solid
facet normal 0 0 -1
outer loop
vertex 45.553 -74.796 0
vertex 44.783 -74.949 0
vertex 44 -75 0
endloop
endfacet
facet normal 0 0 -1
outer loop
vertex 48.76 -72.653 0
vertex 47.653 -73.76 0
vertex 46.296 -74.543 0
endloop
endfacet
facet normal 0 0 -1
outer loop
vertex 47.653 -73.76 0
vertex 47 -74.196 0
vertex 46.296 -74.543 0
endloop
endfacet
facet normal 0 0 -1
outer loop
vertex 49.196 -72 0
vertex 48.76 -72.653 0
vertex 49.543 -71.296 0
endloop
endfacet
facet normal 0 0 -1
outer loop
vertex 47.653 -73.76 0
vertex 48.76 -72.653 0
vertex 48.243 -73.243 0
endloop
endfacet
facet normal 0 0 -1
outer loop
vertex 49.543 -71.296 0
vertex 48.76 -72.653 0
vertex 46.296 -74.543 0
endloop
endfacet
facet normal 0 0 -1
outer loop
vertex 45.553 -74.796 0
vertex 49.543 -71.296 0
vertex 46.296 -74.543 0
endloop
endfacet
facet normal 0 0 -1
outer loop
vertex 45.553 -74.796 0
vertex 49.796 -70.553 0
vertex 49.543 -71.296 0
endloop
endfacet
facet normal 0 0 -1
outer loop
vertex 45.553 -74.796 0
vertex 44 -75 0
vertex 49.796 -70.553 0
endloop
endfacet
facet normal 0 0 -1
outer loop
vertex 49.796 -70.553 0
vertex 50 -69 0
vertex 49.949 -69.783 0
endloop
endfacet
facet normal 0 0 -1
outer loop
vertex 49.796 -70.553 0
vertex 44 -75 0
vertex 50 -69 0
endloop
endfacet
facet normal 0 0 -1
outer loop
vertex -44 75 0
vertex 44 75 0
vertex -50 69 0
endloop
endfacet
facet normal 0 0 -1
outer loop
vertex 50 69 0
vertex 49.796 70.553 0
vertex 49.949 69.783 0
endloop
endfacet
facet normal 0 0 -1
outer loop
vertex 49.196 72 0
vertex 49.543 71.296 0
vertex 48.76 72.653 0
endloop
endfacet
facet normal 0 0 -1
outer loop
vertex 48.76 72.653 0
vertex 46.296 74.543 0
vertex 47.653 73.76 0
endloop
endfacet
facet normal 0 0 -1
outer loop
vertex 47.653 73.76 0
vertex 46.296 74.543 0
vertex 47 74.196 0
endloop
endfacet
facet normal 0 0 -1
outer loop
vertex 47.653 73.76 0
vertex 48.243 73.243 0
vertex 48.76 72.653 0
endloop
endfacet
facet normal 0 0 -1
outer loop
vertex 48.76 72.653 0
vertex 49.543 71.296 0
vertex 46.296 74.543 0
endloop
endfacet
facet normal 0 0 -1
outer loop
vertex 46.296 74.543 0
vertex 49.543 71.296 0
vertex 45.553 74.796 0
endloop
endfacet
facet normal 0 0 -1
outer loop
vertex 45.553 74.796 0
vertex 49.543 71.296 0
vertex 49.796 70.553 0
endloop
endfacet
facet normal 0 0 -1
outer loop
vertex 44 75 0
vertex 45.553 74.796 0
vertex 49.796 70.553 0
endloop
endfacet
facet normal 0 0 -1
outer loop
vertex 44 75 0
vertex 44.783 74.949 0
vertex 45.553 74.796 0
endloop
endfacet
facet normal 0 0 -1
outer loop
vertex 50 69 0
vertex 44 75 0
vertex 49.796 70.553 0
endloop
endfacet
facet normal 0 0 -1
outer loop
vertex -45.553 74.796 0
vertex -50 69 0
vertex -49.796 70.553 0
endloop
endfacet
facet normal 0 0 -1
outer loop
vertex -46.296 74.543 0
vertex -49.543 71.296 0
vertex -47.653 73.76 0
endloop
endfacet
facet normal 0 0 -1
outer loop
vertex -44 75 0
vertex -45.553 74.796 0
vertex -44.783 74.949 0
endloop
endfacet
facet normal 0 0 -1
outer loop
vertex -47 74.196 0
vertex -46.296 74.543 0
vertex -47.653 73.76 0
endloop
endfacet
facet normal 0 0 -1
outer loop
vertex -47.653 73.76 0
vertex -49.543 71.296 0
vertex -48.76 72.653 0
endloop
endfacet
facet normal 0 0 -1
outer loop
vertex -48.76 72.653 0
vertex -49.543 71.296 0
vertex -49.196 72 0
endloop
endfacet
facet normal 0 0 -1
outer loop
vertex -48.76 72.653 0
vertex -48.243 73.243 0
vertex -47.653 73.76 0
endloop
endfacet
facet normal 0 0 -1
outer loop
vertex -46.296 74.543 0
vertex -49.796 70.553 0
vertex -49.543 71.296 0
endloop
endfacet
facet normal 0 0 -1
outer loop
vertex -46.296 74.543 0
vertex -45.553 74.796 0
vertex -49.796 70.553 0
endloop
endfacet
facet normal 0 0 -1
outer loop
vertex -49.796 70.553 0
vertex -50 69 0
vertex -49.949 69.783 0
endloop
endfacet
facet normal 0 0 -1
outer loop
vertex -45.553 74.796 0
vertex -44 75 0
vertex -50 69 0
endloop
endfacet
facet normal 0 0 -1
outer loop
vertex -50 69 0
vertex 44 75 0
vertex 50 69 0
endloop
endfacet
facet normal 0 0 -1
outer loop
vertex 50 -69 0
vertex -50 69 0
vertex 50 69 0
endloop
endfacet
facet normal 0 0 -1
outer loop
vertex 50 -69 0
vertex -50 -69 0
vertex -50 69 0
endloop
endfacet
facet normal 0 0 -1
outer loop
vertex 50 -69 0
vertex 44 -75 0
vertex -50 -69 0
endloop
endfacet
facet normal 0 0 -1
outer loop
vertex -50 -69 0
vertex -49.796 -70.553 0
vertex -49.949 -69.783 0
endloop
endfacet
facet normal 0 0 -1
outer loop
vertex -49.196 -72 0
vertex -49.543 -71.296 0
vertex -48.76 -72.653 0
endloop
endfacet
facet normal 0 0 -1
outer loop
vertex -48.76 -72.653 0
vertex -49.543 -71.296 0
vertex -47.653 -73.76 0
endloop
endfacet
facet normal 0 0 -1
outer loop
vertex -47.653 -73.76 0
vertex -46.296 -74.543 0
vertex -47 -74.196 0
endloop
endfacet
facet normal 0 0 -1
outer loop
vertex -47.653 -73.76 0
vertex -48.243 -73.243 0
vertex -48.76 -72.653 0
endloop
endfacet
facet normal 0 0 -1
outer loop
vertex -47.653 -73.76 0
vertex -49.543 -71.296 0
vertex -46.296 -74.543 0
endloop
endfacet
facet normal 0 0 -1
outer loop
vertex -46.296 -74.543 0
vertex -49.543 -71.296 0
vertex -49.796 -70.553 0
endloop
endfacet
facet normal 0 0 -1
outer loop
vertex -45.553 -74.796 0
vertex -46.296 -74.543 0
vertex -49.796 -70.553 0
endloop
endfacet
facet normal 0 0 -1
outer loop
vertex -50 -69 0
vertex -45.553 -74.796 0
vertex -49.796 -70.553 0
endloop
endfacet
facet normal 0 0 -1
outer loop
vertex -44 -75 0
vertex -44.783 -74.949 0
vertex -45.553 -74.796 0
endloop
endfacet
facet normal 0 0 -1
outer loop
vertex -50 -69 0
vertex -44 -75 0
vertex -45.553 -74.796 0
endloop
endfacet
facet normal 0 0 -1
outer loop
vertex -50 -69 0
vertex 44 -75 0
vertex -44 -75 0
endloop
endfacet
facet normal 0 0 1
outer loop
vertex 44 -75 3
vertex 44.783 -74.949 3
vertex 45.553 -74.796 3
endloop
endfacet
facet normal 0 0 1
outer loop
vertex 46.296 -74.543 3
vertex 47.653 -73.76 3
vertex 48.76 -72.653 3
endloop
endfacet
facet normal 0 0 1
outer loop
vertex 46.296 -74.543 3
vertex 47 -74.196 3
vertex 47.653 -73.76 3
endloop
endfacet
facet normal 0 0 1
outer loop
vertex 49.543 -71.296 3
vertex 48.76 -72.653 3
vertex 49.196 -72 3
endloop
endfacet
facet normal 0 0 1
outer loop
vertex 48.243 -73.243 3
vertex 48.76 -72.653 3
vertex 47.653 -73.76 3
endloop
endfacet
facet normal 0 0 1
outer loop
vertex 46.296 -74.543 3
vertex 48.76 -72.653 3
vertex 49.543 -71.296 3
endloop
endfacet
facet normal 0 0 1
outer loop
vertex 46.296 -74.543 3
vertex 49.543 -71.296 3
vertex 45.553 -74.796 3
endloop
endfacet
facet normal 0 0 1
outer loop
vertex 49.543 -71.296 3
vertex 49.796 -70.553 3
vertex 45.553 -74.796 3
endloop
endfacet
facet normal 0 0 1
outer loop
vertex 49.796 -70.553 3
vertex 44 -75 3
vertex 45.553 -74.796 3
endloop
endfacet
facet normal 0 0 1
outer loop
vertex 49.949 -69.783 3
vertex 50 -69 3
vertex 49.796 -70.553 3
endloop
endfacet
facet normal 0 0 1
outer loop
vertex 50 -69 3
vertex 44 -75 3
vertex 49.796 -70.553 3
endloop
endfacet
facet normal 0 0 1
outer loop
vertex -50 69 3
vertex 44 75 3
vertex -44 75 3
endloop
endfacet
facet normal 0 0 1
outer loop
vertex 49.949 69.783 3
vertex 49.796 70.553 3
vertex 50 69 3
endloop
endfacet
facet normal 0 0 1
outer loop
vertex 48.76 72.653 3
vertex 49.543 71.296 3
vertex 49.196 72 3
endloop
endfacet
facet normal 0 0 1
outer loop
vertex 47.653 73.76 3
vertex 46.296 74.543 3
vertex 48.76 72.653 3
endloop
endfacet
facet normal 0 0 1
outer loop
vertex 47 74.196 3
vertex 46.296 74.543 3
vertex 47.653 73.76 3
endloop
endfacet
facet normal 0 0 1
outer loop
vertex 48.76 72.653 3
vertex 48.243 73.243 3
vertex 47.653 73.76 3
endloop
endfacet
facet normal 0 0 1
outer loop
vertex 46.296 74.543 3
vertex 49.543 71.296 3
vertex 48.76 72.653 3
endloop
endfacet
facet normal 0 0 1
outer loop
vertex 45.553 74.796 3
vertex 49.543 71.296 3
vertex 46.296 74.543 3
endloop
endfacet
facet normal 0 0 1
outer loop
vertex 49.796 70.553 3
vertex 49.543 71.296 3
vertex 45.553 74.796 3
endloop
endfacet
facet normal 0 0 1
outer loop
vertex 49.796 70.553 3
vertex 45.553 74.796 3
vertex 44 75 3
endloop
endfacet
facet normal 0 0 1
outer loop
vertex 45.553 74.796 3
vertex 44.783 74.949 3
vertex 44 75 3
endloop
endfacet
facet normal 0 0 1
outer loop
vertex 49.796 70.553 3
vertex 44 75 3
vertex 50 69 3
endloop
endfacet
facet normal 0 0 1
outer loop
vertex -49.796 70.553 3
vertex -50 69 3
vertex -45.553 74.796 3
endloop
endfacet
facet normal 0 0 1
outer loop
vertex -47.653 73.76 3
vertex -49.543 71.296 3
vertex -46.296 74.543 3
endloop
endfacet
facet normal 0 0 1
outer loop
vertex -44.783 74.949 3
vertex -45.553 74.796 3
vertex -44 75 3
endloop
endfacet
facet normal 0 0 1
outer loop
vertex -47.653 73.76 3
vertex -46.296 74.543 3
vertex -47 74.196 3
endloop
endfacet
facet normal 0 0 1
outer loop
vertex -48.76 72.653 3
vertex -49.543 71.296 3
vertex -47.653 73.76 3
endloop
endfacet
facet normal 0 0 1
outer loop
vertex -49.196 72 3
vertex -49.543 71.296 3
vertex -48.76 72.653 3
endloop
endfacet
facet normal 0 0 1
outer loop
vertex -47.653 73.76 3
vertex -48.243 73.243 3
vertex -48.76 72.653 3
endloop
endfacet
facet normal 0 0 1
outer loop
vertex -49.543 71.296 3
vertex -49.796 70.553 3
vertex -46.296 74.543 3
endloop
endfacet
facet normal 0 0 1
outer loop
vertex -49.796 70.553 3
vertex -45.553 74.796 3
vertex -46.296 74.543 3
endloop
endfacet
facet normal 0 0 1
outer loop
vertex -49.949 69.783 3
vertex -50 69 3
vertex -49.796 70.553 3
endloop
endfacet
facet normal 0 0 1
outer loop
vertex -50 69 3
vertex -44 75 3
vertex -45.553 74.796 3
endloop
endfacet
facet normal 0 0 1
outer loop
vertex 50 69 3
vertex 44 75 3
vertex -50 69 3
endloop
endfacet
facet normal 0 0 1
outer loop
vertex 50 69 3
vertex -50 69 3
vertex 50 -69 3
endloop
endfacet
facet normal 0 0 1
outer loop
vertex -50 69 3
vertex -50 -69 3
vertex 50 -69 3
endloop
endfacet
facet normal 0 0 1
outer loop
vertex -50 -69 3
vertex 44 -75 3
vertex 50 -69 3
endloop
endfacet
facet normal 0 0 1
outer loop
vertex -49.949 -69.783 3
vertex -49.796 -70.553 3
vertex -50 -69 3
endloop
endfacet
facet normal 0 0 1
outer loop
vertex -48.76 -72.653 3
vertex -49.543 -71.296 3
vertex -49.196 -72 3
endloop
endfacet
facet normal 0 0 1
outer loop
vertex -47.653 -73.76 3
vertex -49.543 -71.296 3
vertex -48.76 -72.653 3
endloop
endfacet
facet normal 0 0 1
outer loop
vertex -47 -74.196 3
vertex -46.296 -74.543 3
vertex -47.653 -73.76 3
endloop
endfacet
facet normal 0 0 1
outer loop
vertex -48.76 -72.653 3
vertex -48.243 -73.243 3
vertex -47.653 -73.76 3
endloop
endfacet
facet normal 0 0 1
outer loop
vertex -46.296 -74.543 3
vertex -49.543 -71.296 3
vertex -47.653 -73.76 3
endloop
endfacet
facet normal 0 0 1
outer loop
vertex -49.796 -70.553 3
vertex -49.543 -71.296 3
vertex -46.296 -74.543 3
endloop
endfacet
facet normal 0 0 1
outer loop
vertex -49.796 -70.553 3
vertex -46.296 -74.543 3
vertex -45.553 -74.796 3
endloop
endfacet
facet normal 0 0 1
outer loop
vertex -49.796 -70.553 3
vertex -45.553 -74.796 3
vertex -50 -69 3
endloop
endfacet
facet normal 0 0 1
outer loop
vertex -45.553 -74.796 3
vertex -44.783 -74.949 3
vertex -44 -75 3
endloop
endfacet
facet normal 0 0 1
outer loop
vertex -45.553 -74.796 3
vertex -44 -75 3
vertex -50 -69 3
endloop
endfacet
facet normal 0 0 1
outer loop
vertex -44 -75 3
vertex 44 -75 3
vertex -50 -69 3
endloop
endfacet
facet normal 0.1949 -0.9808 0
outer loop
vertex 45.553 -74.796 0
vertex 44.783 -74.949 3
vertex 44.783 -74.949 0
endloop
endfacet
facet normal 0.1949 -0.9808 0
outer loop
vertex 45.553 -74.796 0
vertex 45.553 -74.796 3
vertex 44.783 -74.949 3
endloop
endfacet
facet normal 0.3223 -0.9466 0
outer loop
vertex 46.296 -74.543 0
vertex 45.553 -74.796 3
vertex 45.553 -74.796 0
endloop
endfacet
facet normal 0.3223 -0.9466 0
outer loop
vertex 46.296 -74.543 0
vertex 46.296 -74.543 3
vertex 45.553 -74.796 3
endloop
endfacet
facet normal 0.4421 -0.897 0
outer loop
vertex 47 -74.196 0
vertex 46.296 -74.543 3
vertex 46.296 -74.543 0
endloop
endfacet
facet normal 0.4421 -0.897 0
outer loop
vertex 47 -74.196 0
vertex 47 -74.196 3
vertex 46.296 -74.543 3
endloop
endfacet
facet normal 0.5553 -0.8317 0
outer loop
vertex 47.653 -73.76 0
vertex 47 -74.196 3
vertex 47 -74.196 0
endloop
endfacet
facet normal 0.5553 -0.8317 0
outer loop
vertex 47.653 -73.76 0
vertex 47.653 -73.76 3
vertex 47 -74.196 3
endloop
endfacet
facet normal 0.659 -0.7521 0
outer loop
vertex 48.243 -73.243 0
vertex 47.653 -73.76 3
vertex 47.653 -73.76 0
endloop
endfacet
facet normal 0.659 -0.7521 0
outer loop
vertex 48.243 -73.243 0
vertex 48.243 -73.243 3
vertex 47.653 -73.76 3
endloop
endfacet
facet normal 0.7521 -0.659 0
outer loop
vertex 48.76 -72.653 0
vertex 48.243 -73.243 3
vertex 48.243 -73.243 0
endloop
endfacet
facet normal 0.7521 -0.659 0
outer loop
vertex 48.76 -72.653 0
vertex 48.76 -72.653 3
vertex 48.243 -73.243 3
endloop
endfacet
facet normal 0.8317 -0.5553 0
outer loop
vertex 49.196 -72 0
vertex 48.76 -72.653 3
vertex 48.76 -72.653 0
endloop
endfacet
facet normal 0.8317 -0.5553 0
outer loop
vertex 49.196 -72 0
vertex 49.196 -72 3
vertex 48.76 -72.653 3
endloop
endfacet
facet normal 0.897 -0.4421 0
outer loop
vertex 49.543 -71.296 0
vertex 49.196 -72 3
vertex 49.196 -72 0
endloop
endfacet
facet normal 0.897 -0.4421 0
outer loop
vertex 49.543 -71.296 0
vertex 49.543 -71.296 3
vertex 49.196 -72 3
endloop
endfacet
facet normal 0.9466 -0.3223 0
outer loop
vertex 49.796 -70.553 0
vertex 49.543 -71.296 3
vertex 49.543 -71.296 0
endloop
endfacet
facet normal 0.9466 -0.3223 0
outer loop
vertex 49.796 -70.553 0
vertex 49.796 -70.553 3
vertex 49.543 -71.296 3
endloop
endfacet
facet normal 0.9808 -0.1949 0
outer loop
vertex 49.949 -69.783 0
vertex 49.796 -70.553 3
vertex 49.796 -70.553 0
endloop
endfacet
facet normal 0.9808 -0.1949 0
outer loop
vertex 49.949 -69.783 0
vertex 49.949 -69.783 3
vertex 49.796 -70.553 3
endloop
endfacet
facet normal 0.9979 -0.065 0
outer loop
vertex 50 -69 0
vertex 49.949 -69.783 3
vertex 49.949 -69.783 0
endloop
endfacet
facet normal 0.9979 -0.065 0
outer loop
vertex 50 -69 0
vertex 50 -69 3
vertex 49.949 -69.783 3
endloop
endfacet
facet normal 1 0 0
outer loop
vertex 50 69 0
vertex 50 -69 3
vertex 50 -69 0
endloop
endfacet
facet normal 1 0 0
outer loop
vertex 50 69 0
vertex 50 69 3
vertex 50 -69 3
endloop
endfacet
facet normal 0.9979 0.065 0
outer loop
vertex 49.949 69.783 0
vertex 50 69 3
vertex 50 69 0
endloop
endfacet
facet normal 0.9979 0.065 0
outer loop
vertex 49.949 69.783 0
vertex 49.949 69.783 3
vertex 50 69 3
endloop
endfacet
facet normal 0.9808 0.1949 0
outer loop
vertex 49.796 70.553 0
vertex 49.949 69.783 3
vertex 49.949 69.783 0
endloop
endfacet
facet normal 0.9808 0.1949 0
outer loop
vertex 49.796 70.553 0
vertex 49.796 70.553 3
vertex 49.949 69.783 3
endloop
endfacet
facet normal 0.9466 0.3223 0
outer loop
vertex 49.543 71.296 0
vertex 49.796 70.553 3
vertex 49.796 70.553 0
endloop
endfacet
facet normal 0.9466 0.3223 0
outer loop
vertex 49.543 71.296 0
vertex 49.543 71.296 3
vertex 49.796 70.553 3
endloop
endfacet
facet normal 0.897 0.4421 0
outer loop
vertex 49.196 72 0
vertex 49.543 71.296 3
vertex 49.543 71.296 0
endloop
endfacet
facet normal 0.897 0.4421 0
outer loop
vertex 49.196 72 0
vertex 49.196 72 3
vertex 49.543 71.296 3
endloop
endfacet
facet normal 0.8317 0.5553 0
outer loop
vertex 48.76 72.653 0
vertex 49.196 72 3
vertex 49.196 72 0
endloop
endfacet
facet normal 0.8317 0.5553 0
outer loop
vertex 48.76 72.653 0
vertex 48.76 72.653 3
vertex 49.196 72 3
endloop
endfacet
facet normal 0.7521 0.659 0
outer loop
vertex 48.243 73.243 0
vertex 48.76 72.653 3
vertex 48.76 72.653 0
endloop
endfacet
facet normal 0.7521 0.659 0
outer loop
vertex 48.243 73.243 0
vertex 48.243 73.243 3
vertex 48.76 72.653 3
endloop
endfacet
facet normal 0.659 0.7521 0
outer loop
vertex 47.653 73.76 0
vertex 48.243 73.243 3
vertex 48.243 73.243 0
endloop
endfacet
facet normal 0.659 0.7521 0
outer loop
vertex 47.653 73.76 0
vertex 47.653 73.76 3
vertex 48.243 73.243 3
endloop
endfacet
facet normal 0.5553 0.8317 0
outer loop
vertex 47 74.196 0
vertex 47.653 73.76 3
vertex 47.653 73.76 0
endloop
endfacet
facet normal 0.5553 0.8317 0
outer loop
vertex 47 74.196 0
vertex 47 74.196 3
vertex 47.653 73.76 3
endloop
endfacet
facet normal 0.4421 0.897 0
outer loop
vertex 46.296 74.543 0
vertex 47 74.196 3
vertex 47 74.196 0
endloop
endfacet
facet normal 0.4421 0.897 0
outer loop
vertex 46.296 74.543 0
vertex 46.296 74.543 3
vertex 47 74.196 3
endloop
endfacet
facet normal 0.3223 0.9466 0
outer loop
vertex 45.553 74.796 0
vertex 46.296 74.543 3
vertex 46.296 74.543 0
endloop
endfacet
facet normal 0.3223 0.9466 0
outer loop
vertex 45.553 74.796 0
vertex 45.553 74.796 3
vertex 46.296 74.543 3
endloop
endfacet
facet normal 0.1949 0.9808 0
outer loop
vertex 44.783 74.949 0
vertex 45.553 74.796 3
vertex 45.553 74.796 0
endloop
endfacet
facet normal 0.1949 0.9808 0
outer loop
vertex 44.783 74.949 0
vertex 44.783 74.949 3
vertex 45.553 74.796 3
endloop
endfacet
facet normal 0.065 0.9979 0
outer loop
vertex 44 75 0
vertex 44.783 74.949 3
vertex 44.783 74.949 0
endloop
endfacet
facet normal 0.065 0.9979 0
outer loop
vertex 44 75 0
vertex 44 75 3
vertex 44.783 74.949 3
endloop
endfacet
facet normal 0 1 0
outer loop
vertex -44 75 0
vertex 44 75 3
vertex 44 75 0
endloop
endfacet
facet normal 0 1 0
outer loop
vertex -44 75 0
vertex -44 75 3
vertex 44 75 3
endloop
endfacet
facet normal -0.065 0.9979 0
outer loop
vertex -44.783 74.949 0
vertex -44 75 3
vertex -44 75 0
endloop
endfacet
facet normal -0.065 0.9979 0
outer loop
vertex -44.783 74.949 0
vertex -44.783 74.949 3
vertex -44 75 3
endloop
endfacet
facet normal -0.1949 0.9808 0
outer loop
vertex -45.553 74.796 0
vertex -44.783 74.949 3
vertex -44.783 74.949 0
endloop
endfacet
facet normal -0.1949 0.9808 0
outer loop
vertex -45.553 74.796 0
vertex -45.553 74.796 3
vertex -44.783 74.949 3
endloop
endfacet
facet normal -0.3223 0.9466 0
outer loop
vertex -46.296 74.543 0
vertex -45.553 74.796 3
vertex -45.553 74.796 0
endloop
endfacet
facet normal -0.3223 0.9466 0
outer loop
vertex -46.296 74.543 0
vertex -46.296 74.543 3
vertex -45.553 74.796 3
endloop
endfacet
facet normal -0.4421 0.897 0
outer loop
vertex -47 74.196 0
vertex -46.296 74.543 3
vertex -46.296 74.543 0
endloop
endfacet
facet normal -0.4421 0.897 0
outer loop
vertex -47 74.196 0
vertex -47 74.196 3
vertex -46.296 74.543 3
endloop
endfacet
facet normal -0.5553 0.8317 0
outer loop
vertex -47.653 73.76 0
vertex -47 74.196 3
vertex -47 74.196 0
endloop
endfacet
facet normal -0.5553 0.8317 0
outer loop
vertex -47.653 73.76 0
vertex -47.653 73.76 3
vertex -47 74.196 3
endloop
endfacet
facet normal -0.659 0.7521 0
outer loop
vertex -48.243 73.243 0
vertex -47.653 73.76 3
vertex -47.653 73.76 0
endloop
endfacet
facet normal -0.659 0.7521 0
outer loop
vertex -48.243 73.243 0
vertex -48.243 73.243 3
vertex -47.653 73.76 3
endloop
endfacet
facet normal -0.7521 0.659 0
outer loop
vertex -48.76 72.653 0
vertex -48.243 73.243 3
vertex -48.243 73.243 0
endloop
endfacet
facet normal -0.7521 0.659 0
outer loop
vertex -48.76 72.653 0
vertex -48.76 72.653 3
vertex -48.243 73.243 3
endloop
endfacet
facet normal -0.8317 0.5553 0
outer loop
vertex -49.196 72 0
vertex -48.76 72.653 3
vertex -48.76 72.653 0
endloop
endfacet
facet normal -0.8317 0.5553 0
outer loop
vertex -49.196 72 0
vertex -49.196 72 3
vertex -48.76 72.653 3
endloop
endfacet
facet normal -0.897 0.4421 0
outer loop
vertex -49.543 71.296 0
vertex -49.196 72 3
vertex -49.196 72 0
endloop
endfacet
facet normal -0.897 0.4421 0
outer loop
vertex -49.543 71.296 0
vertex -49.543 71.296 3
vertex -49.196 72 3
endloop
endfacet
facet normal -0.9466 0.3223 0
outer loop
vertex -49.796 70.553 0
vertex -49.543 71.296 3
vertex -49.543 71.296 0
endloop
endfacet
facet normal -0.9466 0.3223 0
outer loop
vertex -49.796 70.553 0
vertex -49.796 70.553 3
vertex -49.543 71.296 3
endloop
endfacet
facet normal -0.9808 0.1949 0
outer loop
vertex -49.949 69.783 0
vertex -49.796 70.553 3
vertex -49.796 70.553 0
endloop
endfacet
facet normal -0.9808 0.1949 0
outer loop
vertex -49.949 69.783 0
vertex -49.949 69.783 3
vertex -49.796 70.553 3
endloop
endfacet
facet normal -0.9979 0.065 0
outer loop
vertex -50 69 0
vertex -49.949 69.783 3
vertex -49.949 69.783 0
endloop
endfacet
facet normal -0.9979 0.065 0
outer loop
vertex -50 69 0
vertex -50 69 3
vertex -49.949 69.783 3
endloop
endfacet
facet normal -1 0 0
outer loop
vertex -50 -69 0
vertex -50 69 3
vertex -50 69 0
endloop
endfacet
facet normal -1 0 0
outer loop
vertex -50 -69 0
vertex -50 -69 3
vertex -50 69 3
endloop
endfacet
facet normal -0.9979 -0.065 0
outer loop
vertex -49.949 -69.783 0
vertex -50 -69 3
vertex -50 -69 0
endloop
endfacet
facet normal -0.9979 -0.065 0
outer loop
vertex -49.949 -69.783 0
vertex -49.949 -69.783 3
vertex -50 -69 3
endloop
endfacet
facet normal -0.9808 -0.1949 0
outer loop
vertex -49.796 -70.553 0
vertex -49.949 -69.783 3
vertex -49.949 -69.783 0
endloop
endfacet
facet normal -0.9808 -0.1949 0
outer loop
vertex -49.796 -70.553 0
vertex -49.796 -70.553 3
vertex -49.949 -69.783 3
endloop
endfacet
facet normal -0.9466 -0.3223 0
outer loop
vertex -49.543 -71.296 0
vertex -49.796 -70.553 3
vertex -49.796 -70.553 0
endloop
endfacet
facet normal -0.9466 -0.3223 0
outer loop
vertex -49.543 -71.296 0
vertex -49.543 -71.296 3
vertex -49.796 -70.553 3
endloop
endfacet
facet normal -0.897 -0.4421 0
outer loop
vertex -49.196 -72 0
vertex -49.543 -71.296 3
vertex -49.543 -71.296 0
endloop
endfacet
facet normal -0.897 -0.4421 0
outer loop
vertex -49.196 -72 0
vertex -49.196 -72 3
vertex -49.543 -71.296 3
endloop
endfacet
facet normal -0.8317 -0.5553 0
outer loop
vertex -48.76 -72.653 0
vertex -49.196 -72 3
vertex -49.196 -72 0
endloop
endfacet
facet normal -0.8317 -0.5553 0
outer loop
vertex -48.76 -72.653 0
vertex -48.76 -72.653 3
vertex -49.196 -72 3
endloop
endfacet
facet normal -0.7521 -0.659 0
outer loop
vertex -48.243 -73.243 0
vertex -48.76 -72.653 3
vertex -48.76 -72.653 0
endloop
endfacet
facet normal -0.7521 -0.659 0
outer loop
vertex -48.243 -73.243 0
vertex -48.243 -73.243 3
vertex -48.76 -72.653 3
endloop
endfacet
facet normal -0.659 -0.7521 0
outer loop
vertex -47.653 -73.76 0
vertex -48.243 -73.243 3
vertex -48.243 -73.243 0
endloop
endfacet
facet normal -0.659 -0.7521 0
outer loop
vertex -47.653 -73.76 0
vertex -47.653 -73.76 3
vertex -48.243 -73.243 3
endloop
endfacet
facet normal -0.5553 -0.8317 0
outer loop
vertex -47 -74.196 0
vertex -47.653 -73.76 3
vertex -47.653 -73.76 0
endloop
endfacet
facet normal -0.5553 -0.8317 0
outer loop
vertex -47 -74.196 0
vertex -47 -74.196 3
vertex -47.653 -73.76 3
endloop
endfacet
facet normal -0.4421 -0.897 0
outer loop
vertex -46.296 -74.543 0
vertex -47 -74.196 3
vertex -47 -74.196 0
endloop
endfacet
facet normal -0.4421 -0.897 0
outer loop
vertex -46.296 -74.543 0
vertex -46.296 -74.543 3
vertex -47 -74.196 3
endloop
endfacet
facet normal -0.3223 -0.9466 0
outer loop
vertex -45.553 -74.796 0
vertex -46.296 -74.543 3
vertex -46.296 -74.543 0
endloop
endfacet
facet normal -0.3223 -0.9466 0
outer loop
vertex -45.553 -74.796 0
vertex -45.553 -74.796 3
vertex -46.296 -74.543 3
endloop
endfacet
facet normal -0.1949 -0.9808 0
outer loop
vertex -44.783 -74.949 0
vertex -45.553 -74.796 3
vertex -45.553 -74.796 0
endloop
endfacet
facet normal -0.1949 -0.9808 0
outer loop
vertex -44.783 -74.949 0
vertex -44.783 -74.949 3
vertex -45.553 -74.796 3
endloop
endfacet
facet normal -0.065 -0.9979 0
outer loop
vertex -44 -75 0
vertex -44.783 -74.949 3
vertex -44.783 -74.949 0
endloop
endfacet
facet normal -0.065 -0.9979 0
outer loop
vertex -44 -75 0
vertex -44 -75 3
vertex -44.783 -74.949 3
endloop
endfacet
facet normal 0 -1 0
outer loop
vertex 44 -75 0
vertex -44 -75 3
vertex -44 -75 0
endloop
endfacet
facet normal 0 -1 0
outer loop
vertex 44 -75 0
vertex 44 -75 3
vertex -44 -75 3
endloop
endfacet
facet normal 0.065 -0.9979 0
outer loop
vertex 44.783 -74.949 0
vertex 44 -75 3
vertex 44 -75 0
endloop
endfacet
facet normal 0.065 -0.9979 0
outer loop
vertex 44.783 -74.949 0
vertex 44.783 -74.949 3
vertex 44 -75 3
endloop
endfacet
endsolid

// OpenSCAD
// Placa de Wi-Fi com QR Code — modelo próprio do Multiferramenta 3D
// Partes: "placa" e "detalhes" (QR e textos em outra cor)
titulo = "Wi-Fi"; rede = "MinhaRede"; senha = "12345678"; mostrar_senha = true;
fonte = "Poppins:style=Bold";
largura = 100; altura = 150; esp = 3; relevo = 1; margem = 8; raio = 6;
qr = ["1"];
parte = "placa";
$fn = 48;

n = len(qr); lado = largura - 2 * margem; mod = lado / n;
topo_qr = altura / 2 - margem - 18;
module placa() linear_extrude(esp) offset(r = raio) offset(delta = -raio) square([largura, altura], center = true);
module qrcode() translate([-lado / 2, topo_qr - lado]) for (y = [0 : n - 1]) for (x = [0 : n - 1])
  if (qr[y][x] == "1") translate([x * mod, (n - 1 - y) * mod]) square([mod + 0.01, mod + 0.01]);
module linha(t, y, s) translate([0, y]) resize([min(largura - 2 * margem, len(t) * s * 0.75), 0], auto = true) text(t, font = fonte, size = s, halign = "center", valign = "center");
module textos() {
  translate([0, altura / 2 - margem - 7]) text(titulo, font = fonte, size = 10, halign = "center", valign = "center");
  linha(str("Rede: ", rede), topo_qr - lado - 8, 5);
  if (mostrar_senha) linha(str("Senha: ", senha), topo_qr - lado - 16, 5);
}
if (parte == "placa") placa();
else if (parte == "detalhes") translate([0, 0, esp]) linear_extrude(relevo) { qrcode(); textos(); }
